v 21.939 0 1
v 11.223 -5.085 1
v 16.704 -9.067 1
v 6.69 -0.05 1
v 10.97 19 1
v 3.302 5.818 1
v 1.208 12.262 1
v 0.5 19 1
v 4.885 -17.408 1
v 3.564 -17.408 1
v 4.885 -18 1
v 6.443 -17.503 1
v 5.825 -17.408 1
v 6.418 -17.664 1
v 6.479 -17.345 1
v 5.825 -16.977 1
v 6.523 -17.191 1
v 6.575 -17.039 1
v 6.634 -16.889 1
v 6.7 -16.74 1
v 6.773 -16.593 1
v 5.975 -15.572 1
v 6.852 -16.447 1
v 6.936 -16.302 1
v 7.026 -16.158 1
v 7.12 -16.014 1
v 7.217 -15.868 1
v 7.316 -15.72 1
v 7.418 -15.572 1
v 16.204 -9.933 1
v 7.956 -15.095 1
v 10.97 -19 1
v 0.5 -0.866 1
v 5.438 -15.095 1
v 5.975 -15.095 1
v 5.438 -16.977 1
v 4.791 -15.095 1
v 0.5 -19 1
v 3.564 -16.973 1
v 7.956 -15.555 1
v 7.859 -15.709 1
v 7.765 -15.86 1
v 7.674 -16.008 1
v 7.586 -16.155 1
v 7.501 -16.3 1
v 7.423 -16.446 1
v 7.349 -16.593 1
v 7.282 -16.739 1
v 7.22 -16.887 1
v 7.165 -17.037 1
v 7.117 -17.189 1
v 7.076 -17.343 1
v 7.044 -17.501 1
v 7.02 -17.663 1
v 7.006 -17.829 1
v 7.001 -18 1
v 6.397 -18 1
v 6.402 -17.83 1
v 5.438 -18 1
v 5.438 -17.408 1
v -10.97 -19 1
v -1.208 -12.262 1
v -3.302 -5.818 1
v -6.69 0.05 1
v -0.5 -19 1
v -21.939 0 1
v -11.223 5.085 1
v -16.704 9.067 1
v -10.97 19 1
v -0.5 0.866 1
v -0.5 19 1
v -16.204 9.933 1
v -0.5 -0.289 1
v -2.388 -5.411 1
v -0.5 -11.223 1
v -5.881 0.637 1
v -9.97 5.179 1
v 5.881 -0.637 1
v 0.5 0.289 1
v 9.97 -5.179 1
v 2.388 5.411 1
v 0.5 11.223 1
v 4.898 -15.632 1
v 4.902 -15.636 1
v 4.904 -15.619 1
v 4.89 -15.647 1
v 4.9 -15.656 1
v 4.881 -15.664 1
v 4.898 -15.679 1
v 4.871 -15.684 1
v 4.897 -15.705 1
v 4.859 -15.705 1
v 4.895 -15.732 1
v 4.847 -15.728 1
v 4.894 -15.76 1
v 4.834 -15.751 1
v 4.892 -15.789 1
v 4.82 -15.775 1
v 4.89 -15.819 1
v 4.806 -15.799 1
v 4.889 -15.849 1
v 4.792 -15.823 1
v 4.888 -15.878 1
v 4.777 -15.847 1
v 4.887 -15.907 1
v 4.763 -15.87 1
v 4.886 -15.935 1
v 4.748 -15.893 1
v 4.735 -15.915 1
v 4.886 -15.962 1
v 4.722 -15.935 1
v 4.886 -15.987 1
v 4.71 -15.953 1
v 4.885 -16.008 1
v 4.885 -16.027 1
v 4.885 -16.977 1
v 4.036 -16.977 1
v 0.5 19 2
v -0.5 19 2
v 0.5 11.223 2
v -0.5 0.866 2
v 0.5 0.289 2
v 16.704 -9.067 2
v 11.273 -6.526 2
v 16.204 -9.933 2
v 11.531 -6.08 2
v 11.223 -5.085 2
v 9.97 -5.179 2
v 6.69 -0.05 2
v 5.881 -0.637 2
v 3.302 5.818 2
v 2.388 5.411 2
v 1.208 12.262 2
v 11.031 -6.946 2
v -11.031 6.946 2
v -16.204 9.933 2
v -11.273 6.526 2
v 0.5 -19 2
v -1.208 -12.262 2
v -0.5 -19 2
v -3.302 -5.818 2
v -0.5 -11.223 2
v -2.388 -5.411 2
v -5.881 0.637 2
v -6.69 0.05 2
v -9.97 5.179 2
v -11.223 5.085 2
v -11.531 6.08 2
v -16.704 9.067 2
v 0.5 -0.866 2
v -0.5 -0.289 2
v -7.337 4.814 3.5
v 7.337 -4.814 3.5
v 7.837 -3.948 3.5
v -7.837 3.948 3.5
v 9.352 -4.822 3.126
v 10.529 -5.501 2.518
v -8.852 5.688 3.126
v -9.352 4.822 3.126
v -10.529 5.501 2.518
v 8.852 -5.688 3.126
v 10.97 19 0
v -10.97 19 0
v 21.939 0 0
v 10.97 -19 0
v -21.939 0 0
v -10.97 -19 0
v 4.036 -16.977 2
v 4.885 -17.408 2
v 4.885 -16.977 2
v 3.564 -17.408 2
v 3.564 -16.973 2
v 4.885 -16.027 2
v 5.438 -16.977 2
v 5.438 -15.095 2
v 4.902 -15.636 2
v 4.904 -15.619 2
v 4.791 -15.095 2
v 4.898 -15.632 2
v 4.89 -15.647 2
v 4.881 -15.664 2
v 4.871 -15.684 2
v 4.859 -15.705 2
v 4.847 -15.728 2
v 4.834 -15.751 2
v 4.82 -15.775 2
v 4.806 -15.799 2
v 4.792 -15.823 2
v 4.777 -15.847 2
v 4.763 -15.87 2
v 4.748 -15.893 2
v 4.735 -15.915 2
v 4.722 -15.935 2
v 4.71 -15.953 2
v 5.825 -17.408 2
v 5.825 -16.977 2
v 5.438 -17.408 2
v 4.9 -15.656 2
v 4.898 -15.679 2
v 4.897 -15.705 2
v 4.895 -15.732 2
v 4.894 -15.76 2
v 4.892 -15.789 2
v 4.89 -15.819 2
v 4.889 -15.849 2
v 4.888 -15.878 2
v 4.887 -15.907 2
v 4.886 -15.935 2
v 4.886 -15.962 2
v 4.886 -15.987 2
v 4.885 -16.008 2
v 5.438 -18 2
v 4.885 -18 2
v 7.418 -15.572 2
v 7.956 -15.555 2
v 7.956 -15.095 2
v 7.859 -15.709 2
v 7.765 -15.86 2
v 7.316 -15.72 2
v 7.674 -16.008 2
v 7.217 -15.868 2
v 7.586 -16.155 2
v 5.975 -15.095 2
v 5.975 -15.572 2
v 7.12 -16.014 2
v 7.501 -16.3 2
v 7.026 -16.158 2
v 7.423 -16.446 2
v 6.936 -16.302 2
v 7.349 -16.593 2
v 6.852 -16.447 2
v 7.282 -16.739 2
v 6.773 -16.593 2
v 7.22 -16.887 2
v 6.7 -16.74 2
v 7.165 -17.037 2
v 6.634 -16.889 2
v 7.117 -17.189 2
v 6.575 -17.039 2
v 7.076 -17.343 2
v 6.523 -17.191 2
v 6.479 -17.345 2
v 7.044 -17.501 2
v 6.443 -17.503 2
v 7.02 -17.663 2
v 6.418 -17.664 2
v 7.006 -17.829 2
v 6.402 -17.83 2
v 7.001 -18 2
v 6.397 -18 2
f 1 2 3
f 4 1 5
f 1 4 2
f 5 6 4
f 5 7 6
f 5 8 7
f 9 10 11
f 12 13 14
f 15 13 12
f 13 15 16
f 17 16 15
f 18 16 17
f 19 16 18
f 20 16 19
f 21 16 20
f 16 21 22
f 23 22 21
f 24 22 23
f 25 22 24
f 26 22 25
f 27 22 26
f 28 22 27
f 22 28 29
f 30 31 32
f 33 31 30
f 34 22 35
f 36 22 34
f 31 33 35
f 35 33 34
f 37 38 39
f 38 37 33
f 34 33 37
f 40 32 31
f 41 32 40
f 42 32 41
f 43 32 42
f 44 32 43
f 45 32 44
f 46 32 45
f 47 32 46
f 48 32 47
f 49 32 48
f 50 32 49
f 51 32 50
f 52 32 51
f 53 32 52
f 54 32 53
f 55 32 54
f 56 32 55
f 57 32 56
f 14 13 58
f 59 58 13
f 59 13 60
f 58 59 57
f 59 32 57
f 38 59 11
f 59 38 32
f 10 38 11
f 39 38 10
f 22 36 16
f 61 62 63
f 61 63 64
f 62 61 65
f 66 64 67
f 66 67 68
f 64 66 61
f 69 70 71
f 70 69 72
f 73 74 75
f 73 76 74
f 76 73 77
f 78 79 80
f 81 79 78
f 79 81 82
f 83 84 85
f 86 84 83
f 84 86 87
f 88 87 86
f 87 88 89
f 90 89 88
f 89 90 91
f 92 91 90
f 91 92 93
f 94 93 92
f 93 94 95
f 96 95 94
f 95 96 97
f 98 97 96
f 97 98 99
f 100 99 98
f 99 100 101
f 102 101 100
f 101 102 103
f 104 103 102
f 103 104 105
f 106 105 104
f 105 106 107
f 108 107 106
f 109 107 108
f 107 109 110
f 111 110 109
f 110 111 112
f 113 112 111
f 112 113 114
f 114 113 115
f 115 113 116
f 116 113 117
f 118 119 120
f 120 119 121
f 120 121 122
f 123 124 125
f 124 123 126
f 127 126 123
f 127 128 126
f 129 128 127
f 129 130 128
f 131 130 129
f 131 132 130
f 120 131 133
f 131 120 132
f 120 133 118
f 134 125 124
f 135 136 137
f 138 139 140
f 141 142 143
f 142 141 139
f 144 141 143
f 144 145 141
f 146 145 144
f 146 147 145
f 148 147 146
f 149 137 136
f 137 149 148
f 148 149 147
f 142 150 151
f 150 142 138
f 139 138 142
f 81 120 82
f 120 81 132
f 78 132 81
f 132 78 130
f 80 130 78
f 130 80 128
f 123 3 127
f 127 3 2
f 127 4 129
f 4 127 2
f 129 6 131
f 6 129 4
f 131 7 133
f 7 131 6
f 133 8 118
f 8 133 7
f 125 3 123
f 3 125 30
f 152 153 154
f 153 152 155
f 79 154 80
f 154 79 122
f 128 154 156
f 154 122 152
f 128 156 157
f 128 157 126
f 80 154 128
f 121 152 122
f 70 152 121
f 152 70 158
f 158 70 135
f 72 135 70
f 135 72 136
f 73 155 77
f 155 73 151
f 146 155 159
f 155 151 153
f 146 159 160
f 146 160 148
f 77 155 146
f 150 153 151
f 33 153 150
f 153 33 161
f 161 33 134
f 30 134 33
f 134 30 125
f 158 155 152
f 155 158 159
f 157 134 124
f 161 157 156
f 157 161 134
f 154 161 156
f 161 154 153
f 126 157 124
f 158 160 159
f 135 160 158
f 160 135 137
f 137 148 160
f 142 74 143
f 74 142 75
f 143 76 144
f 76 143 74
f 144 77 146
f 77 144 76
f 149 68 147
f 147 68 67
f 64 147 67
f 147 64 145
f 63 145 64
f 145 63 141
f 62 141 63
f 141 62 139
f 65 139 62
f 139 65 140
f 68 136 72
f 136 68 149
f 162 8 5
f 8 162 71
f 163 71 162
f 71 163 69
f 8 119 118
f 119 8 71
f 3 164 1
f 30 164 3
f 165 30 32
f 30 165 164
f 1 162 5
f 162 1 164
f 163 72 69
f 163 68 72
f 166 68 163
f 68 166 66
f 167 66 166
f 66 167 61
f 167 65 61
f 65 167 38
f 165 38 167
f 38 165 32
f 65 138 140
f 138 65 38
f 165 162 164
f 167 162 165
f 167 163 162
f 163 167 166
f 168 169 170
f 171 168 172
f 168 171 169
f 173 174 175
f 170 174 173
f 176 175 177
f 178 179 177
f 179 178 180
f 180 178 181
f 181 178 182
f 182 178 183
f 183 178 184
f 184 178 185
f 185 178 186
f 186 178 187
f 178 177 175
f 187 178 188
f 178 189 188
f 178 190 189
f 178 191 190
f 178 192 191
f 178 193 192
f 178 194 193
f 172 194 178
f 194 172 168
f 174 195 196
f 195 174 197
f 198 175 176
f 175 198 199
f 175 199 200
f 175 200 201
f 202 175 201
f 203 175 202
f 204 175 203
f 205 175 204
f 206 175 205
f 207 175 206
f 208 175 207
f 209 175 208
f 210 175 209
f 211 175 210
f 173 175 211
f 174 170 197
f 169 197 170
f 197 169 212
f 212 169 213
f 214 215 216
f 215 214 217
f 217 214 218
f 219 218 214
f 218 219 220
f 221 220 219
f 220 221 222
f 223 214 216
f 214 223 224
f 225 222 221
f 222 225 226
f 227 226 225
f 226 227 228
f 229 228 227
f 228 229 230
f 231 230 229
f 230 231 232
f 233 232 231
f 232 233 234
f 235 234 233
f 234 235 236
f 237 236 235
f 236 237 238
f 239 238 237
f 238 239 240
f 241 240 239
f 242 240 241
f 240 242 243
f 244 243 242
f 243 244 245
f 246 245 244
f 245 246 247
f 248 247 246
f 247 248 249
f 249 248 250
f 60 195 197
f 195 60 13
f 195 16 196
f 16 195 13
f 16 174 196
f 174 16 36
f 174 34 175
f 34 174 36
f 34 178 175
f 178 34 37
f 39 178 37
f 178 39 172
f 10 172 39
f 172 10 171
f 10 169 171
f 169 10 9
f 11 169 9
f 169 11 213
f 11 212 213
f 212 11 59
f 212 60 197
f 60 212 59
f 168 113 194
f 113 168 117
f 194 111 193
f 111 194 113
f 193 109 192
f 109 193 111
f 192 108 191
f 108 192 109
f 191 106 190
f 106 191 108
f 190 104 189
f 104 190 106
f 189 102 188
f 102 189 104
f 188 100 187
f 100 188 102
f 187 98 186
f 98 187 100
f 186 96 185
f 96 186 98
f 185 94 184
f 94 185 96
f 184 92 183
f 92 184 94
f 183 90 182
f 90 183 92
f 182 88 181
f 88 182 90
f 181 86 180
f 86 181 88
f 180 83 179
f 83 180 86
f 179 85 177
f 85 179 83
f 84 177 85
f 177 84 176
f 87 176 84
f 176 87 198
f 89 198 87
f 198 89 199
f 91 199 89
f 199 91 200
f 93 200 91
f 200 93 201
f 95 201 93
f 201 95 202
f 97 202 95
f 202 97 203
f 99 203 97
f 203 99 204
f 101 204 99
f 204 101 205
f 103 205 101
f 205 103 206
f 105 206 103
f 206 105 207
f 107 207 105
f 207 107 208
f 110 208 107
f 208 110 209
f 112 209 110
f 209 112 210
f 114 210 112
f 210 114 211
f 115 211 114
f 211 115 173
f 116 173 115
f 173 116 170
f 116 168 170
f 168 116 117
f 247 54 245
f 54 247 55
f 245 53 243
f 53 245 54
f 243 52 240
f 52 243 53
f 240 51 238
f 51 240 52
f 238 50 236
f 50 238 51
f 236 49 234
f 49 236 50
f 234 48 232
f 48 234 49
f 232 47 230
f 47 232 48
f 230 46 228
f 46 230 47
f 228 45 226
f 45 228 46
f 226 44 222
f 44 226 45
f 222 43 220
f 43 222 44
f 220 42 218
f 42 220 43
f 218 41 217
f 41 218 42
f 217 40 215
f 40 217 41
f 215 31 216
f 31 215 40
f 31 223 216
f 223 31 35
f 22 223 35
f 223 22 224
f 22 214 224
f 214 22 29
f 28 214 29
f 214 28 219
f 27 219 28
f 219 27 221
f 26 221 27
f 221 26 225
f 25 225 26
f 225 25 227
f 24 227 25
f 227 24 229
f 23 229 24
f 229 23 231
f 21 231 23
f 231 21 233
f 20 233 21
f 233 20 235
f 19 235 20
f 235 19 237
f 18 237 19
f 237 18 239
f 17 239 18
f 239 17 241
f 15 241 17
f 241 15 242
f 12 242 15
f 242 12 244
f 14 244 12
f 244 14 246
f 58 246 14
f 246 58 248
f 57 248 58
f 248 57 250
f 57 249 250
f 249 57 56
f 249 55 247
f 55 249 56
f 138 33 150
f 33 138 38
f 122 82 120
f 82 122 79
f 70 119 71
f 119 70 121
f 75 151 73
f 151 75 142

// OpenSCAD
include <../Scripts/18xx tiles basic functions.scad>
hex("Brown");
put_tilenr("47");
light_curve(r=1);
straight_line_bridge(r=1);
light_curve(r=4);
straight_line();
